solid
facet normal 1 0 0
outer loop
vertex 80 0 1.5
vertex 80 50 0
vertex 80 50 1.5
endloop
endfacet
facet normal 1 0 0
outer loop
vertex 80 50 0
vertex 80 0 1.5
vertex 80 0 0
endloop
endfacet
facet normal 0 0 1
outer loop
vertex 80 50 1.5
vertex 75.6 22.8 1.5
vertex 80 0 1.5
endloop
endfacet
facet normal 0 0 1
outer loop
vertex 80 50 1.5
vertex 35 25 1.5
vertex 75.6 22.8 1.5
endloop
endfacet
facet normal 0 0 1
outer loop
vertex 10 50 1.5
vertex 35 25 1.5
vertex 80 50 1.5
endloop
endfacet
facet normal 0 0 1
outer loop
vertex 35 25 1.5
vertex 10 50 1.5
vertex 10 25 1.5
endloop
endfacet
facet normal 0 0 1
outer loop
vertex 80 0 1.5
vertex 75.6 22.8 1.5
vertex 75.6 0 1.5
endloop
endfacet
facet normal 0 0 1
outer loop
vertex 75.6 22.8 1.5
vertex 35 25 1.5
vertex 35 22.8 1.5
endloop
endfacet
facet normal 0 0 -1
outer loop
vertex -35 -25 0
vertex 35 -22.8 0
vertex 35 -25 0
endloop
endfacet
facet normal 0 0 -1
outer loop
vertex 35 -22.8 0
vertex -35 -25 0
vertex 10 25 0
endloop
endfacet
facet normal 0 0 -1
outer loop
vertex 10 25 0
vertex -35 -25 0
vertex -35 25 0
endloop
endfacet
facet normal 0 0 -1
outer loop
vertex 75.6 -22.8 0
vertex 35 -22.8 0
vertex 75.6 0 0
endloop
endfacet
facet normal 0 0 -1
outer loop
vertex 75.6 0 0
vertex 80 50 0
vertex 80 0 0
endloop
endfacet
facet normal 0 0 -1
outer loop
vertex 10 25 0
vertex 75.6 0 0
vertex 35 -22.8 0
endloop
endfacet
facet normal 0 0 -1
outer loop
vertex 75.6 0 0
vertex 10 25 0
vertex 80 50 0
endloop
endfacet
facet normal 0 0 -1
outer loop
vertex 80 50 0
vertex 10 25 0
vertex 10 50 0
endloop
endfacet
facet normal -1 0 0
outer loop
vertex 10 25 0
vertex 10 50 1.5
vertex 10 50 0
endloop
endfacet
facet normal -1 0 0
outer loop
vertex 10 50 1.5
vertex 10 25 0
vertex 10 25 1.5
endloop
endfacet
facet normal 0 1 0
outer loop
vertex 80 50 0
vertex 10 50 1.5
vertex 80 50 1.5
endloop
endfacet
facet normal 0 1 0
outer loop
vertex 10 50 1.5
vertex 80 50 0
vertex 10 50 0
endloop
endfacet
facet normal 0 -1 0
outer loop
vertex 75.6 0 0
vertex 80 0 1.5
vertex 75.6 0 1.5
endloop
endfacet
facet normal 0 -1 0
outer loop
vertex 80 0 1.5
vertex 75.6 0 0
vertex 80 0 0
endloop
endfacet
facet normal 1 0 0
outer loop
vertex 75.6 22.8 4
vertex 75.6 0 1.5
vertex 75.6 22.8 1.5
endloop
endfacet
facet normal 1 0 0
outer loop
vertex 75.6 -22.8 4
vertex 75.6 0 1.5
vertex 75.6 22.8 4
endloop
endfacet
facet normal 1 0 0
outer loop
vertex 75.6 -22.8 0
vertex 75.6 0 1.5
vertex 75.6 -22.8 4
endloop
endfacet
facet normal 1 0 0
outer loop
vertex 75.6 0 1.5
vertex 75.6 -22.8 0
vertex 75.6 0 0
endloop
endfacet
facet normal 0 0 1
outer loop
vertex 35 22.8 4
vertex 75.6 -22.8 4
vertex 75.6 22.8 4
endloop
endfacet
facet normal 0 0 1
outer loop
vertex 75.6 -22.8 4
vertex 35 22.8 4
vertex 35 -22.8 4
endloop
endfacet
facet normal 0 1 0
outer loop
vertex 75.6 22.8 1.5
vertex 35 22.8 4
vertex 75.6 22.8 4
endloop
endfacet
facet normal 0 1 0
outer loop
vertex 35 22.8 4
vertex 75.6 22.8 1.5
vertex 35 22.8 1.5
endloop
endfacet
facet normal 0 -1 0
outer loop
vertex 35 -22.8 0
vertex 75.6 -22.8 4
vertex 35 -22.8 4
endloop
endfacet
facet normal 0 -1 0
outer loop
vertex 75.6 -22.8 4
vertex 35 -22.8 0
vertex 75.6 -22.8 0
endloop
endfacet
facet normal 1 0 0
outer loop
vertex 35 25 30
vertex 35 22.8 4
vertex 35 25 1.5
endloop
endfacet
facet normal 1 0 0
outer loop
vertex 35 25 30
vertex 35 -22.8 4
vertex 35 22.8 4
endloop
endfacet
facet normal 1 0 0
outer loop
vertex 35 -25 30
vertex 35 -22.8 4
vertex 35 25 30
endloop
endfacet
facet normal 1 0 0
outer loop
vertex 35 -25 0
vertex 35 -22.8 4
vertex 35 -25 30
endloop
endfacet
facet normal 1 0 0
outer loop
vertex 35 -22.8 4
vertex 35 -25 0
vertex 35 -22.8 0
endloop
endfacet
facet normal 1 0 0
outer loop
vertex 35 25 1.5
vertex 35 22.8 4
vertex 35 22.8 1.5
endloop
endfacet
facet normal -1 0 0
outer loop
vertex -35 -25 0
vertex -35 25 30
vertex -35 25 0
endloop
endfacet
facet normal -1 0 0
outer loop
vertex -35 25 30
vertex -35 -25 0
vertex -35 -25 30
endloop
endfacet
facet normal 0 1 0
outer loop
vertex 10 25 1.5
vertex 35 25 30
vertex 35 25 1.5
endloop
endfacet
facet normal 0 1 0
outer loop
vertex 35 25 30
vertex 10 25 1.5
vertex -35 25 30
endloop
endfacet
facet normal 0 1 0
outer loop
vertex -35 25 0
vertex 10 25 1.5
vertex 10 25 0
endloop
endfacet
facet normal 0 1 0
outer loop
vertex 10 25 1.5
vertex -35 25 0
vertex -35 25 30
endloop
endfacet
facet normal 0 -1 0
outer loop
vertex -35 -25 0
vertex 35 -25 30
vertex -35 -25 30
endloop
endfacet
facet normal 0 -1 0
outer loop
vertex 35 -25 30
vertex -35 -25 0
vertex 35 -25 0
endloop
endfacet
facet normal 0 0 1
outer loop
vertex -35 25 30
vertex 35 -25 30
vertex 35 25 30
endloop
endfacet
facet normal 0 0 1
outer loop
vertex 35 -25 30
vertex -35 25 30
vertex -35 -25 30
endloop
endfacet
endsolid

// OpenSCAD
// Two-part enclosure for small electronics board
// Print orientation: box upright, lid upside down (lip on top)

// ---- Parameters ----
box_x      = 70;    // box outer length (X)
box_y      = 50;    // box outer width (Y)
box_z      = 30;    // box outer height (Z)
box_w      = 2;     // box wall thickness
box_floor  = 2;     // box floor thickness
gap        = 10;    // gap between box and lid
lip_t      = 1.5;   // lid lip thickness (wall)
lip_h      = 4;     // lid lip height
eps        = 0.5;   // cut overlap

$fn = 64;

// ---- Derived ----
box_id_x = box_x - 2*box_w;   // inner length
box_id_y = box_y - 2*box_w;   // inner width
lip_w    = box_id_x - 0.4;    // lip outer length (0.2 clearance each side)
lip_d    = box_id_y - 0.4;    // lip outer width (0.2 clearance each side)

// ---- Model ----
union() {
    // Box
    translate([-box_x/2, -box_y/2, 0])
        cube([box_x, box_y, box_floor]);
    translate([-box_x/2, -box_y/2, box_floor])
        cube([box_x, box_y, box_z - box_floor]);

    // Lid (plate + lip), centred on origin, placed on +X side
    translate([gap, 0, 0])
        union() {
            // Plate
            cube([box_x, box_y, lip_t]);
            // Lip
            translate([0, -lip_d/2, 0])
                cube([lip_w, lip_d, lip_h]);
        }
}
